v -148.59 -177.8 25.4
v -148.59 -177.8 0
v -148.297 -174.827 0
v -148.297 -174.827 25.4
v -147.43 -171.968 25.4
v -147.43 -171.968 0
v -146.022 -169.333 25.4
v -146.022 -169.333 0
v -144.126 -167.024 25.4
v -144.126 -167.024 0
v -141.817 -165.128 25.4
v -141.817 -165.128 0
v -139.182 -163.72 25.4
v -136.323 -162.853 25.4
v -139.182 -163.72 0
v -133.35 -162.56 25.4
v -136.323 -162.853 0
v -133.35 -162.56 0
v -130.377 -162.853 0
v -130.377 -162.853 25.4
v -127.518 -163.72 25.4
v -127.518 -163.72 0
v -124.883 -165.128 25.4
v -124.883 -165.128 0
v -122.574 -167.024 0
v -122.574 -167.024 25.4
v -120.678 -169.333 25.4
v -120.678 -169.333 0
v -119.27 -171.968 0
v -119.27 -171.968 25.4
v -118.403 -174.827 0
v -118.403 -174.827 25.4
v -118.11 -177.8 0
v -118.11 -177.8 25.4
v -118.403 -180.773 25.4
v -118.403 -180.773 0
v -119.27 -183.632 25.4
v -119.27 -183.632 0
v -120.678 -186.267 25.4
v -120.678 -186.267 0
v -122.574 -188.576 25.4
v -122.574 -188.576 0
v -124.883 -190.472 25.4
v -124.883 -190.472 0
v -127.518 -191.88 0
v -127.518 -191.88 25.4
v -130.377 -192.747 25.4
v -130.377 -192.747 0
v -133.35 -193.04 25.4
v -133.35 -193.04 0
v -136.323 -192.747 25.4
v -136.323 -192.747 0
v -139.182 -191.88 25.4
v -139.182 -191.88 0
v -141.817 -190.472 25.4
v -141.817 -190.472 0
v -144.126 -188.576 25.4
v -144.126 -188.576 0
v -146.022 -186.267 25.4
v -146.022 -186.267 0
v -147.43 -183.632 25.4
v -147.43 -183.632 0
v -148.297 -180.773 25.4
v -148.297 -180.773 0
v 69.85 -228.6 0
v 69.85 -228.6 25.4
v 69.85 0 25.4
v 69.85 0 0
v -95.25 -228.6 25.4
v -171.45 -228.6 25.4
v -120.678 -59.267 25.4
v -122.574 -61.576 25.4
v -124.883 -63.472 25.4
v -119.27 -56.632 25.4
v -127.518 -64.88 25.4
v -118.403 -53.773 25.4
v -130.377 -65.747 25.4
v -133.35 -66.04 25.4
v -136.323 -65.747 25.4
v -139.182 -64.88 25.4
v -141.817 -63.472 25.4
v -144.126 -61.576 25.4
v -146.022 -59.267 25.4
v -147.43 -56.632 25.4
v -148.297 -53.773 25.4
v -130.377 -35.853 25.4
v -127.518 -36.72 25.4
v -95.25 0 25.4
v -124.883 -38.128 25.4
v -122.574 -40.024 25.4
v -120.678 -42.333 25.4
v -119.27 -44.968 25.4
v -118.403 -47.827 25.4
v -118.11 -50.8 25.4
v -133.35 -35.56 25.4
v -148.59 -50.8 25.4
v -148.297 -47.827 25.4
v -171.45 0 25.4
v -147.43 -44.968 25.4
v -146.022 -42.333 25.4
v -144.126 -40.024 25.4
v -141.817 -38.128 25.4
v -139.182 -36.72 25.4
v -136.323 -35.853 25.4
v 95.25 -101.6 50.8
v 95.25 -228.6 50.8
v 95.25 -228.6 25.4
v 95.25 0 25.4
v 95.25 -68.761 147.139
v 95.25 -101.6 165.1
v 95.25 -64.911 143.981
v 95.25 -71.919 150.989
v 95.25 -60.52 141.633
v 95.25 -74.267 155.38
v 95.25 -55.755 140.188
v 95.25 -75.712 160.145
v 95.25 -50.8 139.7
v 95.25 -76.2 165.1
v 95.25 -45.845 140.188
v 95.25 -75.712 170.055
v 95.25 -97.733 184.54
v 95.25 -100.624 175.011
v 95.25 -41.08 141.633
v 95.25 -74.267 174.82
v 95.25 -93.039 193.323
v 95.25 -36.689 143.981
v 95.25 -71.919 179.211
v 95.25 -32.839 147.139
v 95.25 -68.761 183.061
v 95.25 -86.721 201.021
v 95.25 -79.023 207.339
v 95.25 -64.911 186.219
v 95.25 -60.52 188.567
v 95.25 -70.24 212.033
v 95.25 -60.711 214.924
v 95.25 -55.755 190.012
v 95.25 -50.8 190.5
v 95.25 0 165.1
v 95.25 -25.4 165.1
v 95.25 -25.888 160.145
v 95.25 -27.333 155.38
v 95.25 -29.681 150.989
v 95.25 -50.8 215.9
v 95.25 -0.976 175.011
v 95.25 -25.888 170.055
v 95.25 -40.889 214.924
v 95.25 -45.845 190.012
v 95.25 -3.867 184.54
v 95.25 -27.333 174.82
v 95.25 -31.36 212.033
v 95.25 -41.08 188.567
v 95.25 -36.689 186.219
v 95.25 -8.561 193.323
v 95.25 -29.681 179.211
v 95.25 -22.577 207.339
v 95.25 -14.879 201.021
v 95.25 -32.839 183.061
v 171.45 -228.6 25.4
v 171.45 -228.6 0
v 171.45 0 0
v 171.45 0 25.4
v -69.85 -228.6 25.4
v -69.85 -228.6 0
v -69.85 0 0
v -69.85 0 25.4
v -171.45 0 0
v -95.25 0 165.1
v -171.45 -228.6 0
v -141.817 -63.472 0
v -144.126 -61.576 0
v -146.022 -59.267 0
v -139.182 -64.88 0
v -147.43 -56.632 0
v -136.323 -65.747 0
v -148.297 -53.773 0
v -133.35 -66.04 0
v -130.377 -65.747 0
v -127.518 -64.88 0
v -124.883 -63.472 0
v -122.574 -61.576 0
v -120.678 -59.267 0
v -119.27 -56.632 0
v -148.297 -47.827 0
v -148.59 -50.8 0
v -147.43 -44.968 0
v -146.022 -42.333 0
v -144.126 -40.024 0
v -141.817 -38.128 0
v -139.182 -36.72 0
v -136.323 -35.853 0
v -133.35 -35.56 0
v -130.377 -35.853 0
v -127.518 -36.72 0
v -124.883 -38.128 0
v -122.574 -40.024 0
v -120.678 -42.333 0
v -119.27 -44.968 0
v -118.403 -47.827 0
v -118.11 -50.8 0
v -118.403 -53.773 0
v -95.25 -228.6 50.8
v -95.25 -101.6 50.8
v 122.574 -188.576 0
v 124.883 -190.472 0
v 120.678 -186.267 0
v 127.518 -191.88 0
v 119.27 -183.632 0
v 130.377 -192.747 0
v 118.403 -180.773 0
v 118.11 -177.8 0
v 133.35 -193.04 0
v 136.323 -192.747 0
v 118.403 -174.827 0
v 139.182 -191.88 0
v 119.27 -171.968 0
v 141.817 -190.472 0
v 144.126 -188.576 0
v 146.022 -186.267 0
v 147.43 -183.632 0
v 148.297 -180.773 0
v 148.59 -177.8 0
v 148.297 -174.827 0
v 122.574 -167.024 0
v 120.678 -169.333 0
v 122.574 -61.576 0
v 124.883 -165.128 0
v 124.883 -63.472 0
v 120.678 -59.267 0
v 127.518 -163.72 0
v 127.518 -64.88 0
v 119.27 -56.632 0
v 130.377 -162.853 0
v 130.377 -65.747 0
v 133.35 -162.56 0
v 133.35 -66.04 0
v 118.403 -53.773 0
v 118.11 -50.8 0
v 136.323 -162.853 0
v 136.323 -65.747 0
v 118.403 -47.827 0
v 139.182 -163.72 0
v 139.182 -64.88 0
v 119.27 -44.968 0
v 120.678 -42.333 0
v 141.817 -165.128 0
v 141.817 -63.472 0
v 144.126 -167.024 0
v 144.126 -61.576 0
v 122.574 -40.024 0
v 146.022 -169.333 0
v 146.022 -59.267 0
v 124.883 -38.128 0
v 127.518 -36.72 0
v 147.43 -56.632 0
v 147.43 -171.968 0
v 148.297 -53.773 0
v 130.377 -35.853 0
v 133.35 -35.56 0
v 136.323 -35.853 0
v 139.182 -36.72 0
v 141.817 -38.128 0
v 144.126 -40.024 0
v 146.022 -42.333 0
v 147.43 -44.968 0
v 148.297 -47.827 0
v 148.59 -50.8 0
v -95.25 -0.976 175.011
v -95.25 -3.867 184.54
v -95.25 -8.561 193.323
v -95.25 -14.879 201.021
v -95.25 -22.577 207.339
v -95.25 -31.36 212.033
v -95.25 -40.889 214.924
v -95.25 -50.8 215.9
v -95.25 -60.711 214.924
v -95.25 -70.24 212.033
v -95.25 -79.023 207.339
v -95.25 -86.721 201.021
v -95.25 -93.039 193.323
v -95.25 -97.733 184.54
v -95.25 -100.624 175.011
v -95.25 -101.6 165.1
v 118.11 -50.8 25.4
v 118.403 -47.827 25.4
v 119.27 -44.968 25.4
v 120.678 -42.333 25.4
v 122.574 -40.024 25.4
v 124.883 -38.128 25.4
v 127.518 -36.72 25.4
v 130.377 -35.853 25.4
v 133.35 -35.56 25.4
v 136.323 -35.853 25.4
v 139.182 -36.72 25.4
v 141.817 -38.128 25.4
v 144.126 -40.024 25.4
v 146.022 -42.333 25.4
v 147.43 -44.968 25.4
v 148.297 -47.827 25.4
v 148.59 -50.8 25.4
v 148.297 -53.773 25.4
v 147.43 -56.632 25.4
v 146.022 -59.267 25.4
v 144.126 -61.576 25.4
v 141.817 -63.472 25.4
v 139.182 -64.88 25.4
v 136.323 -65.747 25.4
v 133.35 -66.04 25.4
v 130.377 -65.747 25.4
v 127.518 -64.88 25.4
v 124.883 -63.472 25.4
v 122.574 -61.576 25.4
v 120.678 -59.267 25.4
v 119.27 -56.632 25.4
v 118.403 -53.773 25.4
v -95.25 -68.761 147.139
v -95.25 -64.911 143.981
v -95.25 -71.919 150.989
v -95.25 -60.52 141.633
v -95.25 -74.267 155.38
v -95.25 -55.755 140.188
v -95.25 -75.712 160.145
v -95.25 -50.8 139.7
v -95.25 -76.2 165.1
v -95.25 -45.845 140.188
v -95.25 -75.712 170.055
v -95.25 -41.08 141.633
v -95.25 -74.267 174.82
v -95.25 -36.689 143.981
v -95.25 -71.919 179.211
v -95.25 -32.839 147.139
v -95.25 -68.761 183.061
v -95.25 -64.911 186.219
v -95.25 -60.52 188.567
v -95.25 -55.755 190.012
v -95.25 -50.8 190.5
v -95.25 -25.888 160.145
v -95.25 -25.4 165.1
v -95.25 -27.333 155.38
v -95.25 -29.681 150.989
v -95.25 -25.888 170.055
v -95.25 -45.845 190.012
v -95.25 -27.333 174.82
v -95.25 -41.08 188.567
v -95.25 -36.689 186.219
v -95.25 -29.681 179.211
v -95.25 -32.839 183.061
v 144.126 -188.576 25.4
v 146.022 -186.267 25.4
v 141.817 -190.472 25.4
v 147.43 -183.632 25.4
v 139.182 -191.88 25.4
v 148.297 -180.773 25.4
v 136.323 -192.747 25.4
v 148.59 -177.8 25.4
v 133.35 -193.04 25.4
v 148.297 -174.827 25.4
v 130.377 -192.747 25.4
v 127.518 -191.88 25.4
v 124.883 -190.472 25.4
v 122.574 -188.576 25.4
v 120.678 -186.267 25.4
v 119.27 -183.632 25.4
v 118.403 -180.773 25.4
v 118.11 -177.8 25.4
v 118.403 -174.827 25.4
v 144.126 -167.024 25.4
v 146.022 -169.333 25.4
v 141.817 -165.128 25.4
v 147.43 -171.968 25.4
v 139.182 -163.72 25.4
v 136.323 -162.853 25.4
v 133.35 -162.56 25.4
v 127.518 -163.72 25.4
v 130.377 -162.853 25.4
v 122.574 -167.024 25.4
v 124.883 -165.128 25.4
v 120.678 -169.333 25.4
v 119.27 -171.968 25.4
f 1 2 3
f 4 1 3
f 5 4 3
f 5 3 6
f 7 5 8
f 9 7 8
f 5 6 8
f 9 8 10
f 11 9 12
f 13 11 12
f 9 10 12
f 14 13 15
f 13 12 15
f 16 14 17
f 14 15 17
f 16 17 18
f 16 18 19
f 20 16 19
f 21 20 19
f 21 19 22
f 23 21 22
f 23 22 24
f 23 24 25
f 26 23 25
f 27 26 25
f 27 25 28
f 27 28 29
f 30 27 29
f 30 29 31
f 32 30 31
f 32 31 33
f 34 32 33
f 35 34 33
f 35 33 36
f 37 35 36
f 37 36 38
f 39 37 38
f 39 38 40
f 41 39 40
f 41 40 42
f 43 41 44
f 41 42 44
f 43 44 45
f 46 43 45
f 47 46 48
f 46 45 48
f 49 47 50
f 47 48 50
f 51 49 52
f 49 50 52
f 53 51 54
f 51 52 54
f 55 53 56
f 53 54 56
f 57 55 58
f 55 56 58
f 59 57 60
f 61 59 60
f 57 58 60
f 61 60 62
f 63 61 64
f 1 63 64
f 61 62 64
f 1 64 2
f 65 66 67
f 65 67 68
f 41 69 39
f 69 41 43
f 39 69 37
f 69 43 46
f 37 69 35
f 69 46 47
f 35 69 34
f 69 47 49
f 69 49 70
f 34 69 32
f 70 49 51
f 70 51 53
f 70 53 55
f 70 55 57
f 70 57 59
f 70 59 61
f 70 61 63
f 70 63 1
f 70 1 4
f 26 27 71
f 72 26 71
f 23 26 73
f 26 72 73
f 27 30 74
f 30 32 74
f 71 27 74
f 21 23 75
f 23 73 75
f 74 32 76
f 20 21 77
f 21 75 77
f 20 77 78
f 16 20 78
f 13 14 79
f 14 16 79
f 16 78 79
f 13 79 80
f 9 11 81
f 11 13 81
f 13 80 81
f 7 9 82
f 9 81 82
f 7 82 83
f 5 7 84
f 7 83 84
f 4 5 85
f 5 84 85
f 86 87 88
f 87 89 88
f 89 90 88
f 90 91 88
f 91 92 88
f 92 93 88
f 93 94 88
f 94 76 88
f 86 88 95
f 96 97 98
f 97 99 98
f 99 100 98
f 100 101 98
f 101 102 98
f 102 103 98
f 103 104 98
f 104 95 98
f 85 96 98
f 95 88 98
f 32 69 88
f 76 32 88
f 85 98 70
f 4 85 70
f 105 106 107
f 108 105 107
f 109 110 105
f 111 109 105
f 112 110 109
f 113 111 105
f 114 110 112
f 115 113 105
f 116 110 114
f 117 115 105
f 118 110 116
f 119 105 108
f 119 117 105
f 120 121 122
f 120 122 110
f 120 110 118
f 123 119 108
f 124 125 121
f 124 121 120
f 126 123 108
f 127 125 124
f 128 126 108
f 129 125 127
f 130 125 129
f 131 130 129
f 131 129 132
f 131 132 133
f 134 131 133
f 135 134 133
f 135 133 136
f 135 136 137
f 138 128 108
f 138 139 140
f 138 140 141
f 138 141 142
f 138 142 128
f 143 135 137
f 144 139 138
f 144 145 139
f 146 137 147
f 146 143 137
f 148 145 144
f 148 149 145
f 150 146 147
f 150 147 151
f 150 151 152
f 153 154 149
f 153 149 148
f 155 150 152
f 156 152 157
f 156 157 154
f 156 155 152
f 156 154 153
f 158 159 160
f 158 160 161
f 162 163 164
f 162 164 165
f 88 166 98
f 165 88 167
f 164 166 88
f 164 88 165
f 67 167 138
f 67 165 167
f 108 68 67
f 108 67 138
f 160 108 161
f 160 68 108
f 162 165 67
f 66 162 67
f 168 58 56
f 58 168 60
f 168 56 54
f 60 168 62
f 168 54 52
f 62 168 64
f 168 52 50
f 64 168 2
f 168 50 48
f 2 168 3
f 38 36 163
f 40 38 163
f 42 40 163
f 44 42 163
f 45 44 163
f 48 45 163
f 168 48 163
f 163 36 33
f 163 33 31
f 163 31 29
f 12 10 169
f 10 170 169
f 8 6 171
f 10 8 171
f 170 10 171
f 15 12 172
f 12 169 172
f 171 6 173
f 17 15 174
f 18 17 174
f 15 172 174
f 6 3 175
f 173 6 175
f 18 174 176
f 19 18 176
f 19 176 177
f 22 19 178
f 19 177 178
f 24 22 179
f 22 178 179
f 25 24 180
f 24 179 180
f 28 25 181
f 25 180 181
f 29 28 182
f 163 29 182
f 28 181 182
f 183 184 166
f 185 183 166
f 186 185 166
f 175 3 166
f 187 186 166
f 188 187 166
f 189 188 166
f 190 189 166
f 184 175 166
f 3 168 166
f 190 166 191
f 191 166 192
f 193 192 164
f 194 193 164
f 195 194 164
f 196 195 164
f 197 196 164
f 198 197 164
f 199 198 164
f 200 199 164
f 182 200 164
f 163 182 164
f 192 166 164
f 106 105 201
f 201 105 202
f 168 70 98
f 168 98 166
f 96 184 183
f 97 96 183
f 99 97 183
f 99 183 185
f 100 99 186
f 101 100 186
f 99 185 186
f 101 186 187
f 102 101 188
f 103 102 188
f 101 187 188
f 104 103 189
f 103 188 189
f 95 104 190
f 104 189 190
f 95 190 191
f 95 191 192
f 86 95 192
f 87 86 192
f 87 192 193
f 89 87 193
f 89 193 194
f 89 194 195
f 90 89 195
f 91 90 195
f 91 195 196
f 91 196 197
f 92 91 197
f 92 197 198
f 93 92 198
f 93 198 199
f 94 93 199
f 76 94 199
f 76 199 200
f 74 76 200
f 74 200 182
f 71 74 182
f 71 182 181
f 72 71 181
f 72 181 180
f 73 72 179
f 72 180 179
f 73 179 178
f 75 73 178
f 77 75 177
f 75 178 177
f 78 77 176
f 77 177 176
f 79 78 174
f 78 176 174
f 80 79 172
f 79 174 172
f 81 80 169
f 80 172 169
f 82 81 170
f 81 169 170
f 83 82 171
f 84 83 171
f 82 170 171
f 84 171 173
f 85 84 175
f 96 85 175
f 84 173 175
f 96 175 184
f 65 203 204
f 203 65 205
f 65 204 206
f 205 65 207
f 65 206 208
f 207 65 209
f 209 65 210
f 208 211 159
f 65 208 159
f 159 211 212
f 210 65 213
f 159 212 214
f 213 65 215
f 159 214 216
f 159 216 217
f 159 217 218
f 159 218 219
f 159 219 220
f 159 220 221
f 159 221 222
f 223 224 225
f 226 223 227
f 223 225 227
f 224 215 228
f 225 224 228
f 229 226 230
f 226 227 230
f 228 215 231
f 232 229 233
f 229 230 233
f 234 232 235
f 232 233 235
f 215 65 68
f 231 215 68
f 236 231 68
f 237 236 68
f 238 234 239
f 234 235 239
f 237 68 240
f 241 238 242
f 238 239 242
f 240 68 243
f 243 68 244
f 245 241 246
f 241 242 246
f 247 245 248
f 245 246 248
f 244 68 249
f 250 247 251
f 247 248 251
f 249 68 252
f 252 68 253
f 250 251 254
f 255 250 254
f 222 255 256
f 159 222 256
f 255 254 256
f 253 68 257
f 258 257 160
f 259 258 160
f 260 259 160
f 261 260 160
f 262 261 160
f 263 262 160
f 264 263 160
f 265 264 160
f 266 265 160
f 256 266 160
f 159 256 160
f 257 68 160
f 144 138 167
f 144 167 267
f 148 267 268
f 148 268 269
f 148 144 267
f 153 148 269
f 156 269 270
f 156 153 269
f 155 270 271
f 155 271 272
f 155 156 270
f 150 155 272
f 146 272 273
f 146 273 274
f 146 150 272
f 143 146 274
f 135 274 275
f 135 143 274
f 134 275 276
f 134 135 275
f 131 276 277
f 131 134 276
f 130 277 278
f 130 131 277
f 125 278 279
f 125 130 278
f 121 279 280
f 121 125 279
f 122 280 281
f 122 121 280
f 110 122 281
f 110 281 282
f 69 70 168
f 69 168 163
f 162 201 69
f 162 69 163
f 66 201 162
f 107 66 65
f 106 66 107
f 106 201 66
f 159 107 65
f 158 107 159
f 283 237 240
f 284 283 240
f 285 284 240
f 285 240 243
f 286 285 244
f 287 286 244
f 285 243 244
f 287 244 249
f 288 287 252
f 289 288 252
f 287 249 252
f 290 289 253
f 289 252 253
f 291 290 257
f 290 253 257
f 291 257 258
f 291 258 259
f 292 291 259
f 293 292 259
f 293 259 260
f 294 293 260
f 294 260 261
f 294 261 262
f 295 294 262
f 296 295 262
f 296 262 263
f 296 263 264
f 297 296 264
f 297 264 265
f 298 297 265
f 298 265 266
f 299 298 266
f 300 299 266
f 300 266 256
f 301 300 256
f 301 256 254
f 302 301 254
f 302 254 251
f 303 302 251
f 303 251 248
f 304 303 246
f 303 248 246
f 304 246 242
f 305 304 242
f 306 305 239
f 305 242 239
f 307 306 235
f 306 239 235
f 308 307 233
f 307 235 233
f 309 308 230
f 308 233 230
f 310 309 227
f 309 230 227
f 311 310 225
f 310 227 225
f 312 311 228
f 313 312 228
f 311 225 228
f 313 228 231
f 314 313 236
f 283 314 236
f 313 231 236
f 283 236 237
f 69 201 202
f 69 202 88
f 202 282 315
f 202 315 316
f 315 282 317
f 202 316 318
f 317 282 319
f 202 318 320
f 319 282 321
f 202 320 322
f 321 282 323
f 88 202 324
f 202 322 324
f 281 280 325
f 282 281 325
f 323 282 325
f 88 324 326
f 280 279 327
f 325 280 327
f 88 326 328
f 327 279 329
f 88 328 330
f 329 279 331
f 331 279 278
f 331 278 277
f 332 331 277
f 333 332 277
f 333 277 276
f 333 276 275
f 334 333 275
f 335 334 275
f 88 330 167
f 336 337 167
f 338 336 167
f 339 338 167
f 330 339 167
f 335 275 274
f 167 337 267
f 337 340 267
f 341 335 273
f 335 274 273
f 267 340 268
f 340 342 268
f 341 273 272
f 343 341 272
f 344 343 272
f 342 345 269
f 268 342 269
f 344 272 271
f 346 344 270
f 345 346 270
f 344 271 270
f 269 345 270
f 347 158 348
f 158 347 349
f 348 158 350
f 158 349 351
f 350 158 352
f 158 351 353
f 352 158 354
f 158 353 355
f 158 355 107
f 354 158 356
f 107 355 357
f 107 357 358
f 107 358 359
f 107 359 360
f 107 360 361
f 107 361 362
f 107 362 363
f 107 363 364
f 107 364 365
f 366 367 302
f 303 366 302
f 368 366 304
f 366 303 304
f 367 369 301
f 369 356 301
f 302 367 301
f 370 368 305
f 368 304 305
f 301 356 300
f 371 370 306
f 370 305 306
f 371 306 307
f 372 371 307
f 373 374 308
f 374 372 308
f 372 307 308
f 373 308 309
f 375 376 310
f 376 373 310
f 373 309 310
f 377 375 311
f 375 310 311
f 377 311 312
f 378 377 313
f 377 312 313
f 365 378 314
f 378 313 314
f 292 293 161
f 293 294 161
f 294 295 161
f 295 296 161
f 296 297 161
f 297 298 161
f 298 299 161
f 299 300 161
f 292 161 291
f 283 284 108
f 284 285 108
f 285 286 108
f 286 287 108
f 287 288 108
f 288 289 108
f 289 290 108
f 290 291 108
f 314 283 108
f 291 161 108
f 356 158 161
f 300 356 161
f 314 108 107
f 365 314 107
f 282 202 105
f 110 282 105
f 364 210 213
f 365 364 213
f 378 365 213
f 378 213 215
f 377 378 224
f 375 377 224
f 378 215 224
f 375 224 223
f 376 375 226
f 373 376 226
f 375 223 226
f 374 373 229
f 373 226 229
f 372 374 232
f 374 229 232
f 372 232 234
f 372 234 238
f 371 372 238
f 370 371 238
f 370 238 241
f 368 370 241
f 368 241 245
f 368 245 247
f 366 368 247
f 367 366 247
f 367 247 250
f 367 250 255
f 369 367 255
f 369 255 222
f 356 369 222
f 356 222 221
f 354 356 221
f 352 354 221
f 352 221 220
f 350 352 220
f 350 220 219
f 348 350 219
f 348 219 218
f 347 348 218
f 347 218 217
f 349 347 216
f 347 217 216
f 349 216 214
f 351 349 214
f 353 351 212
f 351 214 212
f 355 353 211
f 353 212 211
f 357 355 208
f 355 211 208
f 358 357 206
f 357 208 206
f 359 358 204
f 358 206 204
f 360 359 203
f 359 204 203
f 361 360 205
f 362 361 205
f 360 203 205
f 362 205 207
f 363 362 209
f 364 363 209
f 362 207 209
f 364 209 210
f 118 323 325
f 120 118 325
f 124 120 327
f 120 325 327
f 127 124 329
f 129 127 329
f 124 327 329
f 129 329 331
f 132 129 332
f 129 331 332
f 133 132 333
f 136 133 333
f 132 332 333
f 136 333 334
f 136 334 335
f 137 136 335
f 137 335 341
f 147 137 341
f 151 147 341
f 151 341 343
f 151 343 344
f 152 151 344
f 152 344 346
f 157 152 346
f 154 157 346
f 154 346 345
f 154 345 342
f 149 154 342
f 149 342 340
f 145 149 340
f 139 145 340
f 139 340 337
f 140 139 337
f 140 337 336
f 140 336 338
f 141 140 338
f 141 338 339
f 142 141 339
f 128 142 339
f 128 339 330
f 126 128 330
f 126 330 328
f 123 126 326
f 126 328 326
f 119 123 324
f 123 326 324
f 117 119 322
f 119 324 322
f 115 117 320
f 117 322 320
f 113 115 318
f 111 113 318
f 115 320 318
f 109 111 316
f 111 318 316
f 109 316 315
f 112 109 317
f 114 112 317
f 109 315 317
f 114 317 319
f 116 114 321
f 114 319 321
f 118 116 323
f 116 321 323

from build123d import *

# Parameters (mm, degrees)
F1_DEPTH = 228.6
F2_W     = 190.5
F2_H     = 101.6
F3_DEPTH = 114.3
F5_DEPTH = 190.5
F8_D     = 50.8
F10_D    = 30.48


with BuildPart() as f1:
    # F0 (on Front) → F1 (new body)
    with BuildSketch(Plane.XZ):
        Polygon((-69.85, 25.4), (0, 25.4), (69.85, 25.4), (69.85, 0), (171.45, 0), (171.45, 25.4), (95.25, 25.4), (95.25, 50.8), (0, 50.8), (-95.25, 50.8), (-95.25, 25.4), (-171.45, 25.4), (-171.45, 0), (-69.85, 0), align=None)
    extrude(amount=F1_DEPTH)

    # F2 (on face) → F3 (join)
    with BuildSketch(Plane.XY.offset(50.8)):
        with Locations((0, -50.8)):
            Rectangle(F2_W, F2_H)
    extrude(amount=F3_DEPTH)

    # F4 (on face) → F5 (join)
    with BuildSketch(Plane.YZ.offset(95.25)):
        with BuildLine():
            Line((-101.6, 165.1), (0, 165.1))
            ThreePointArc((0, 165.1), (-50.8, 215.9), (-101.6, 165.1))
        make_face()
        with BuildLine():
            Line((0, 25.4), (0, 165.1))
            ThreePointArc((0, 165.1), (-50.8, 114.3), (-101.6, 165.1))
            Line((-101.6, 165.1), (-101.6, 50.8))
            Line((-101.6, 50.8), (-228.6, 50.8))
            Line((-228.6, 50.8), (-228.6, 25.4))
            Line((-228.6, 25.4), (0, 25.4))
        make_face()
    extrude(amount=-F5_DEPTH)

    # F8 (through all)
    with Locations(Plane.YZ.offset(95.25)):
        with Locations((-50.8, 165.1)):
            Hole(F8_D / 2)

    # F10 (through all)
    with Locations(Plane.XY.offset(25.4)):
        with Locations((-133.35, -50.8), (133.35, -50.8), (-133.35, -177.8), (133.35, -177.8)):
            Hole(F10_D / 2)


solid = f1.part
